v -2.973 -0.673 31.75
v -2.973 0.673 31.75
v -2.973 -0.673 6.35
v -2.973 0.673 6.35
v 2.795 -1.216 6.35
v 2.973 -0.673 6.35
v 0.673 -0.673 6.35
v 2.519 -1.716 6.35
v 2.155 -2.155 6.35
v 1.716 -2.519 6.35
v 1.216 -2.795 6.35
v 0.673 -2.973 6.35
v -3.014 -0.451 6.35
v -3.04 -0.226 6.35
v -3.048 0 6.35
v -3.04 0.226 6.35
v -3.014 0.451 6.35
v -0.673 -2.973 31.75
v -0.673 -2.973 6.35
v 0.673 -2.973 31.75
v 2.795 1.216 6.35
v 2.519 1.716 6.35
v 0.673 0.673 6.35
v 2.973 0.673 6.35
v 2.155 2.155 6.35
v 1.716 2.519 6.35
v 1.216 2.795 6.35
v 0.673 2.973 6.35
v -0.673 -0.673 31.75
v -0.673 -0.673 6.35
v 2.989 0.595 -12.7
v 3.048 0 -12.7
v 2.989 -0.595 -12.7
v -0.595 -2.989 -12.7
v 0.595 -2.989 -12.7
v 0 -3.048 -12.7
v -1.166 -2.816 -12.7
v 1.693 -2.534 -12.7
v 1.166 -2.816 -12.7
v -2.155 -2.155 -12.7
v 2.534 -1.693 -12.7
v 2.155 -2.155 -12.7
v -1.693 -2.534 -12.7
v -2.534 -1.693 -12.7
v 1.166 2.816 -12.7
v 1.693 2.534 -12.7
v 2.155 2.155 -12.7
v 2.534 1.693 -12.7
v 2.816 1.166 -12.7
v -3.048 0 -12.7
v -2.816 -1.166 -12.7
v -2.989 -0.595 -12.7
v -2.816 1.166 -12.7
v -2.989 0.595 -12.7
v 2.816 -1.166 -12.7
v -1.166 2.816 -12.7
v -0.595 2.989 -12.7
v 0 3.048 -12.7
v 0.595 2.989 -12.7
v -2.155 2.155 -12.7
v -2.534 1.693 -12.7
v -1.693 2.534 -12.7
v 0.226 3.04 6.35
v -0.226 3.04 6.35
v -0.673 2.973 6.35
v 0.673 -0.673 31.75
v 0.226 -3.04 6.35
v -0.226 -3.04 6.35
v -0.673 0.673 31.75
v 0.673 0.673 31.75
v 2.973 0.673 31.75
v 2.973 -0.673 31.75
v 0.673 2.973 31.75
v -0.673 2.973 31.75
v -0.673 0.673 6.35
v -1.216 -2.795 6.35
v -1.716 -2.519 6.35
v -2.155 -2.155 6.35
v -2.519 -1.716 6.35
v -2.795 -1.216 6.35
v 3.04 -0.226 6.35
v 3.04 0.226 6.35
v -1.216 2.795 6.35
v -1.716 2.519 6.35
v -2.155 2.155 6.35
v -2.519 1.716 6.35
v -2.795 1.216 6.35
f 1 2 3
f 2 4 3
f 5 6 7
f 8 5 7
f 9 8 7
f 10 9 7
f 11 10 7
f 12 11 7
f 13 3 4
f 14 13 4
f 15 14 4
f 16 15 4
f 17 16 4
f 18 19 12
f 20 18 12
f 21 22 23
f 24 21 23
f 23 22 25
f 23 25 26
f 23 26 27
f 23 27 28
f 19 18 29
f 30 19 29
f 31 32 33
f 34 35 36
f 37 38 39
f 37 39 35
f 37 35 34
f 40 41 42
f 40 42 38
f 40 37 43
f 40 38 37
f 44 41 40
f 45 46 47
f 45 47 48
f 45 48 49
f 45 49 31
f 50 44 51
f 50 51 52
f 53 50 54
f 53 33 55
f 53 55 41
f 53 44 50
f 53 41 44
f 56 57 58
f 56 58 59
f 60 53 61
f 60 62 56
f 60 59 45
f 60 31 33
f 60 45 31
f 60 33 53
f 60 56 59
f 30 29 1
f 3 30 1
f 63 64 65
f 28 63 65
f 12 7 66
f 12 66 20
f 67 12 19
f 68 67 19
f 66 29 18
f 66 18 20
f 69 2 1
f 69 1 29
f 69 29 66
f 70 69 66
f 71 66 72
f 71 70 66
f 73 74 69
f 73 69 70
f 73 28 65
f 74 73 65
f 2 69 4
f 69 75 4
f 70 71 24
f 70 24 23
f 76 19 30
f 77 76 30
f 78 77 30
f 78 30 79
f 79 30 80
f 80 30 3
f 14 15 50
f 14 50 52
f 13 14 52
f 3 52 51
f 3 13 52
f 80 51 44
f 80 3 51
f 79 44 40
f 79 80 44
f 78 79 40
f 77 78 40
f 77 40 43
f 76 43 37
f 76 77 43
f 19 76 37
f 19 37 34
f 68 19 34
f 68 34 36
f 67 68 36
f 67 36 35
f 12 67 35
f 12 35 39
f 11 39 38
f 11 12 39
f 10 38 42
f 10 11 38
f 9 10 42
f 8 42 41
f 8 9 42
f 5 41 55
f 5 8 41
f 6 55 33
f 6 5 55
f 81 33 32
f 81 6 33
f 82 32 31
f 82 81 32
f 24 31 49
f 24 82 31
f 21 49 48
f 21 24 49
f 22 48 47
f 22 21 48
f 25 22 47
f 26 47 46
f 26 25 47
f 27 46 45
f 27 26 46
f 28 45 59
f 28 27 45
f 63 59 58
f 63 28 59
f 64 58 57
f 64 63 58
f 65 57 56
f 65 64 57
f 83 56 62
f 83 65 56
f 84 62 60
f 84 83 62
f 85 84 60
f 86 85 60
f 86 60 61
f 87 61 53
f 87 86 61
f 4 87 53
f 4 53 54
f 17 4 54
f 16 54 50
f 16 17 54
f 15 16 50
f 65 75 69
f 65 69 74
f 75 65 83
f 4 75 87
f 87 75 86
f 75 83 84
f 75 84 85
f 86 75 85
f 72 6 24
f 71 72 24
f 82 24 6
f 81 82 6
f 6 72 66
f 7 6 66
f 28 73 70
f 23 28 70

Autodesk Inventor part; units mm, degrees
ref_plane "YZ Plane" through (0, 0, 0) normal (1, 0, 0) x (0, 1, 0)
ref_plane "XZ Plane" through (0, 0, 0) normal (0, 1, 0) x (-1, 0, 0)
ref_plane "XY Plane" through (0, 0, 0) normal (0, 0, 1) x (1, 0, 0)
sketch "Sketch1" plane through (0, 0, 0) normal (0, 0, 1) x (1, 0, 0)
  circle A0 centre (0, 0) radius 3.048
  dimension "d0" = 6.096
extrude "Extrusion1" add sketch "Sketch1" along normal blind 38.1
sketch "Sketch2" plane through (0, 0, 0) normal (0, 0, -1) x (-1, 0, 0)
  circle A0 centre (0, 0) radius 3.048
extrude "Extrusion2" cut sketch "Sketch2" against normal blind 6.35
sketch "Sketch3" plane through (0, 0, 6.35) normal (0, 0, -1) x (-1, 0, 0)
  circle A0 centre (0, 0) radius 3.048 projected
  line L0 (0, 0) -> (0, 0.6747) construction
  line L1 (-2.9727, 0.6731) -> (-0.6731, 0.6731)
  line L2 (0.6731, 0.6731) -> (2.9727, 0.6731)
  line L3 (-0.6731, 2.9727) -> (-0.6731, 0.6731)
  line L4 (-0.6731, -0.6731) -> (-0.6731, -2.9727)
  line L5 (0.6731, -2.9727) -> (0.6731, -0.6731)
  line L6 (0.6731, 0.6731) -> (0.6731, 2.9727)
  line L7 (-2.9727, -0.6731) -> (-0.6731, -0.6731)
  line L8 (0.6731, -0.6731) -> (2.9727, -0.6731)
  arc A1 (-0.6731, 2.9727) -> (-2.9727, 0.6731) centre (0, 0) ccw
  arc A2 (2.9727, 0.6731) -> (0.6731, 2.9727) centre (0, 0) ccw
  arc A3 (-2.9727, -0.6731) -> (-0.6731, -2.9727) centre (0, 0) ccw
  arc A4 (0.6731, -2.9727) -> (2.9727, -0.6731) centre (0, 0) ccw
  dimension "d5" = 1.3462
extrude "Extrusion3" cut sketch "Sketch3" against normal blind 31.75 contours L2 L6 A0 | A0 L5 L8 | L3 L1 A0 | A0 L7 L4
sketch "Sketch4" plane through (0, 0, 6.35) normal (0, 0, -1) x (-1, 0, 0)
  circle A0 centre (0, 0) radius 3.048 projected
  line L0 (-0.6731, 2.9727) -> (0.6731, 2.9727)
  line L1 (-2.9727, -0.6731) -> (-2.9727, 0.6731)
  line L2 (0.6731, -2.9727) -> (-0.6731, -2.9727)
  line L3 (2.9727, 0.6731) -> (2.9727, -0.6731)
  arc A1 (0.6731, 2.9727) -> (-0.6731, 2.9727) centre (0, 0) ccw
  arc A2 (2.9727, -0.6731) -> (2.9727, 0.6731) centre (0, 0) ccw
  arc A3 (-2.9727, 0.6731) -> (-2.9727, -0.6731) centre (0, 0) ccw
  arc A4 (-0.6731, -2.9727) -> (0.6731, -2.9727) centre (0, 0) ccw
  point P0 (-0.6731, -2.9727)
  point P1 (2.9727, -0.6731)
  point P2 (-2.9727, 0.6731)
  dimension "d14" = 360
extrude "Extrusion4" cut sketch "Sketch4" against normal blind 25.4 contours A0 L3 | L0 A0 | A0 L2 | L1 A0
sketch "Sketch5" plane through (0, 0, 6.35) normal (0, 0, -1) x (-1, 0, 0)
  circle A0 centre (0, 0) radius 3.048
  dimension "d18" = 6.096
extrude "Extrusion5" add sketch "Sketch5" along normal blind 6.35
sketch "Sketch6" plane through (0, 0, 38.1) normal (0, 0, 1) x (1, 0, 0)
  circle A0 centre (0, 0) radius 3.048
  dimension "d21" = 6.096
extrude "Extrusion6" cut sketch "Sketch6" against normal blind 6.35
sketch "Sketch7" plane through (0, 0, 31.75) normal (0, 0, 1) x (1, 0, 0)
  line L0 (-0.6731, 2.9727) -> (0.6731, 2.9727) projected
  line L1 (0.6731, -0.6731) -> (0.6731, -2.9727) projected
  line L2 (-0.6731, 2.9727) -> (0.6731, 2.9727)
  line L3 (0.6731, -2.9727) -> (-0.6731, -2.9727)
  line L4 (-2.9727, -0.6731) -> (-2.9727, 0.6731) projected
  line L5 (2.9727, -0.6731) -> (2.9727, -0.6731) projected
  line L6 (2.9727, 0.6731) -> (2.9727, -0.6731)
  line L7 (-2.9727, -0.6731) -> (-2.9727, 0.6731)
  line L8 (-2.9727, 0.6731) -> (-0.6731, 0.6731)
  line L9 (0.6731, 0.6731) -> (2.9727, 0.6731)
  line L10 (-0.6731, -2.9727) -> (-0.6731, -0.6731)
  line L11 (-0.6731, 0.6731) -> (-0.6731, 2.9727)
  line L12 (0.6731, 2.9727) -> (0.6731, 0.6731)
  line L13 (0.6731, -0.6731) -> (0.6731, -2.9727)
  line L14 (2.9727, -0.6731) -> (0.6731, -0.6731)
  line L15 (-0.6731, -0.6731) -> (-2.9727, -0.6731)
  point P0 (0, 0)
sketch "Sketch8" plane through (0, 0, 0) normal (0, 0, -1) x (-1, 0, 0)
  circle A0 centre (0, 0) radius 3.048
extrude "Extrusion7" add sketch "Sketch8" along normal blind 12.7
properties part number "Bistable Rod"
